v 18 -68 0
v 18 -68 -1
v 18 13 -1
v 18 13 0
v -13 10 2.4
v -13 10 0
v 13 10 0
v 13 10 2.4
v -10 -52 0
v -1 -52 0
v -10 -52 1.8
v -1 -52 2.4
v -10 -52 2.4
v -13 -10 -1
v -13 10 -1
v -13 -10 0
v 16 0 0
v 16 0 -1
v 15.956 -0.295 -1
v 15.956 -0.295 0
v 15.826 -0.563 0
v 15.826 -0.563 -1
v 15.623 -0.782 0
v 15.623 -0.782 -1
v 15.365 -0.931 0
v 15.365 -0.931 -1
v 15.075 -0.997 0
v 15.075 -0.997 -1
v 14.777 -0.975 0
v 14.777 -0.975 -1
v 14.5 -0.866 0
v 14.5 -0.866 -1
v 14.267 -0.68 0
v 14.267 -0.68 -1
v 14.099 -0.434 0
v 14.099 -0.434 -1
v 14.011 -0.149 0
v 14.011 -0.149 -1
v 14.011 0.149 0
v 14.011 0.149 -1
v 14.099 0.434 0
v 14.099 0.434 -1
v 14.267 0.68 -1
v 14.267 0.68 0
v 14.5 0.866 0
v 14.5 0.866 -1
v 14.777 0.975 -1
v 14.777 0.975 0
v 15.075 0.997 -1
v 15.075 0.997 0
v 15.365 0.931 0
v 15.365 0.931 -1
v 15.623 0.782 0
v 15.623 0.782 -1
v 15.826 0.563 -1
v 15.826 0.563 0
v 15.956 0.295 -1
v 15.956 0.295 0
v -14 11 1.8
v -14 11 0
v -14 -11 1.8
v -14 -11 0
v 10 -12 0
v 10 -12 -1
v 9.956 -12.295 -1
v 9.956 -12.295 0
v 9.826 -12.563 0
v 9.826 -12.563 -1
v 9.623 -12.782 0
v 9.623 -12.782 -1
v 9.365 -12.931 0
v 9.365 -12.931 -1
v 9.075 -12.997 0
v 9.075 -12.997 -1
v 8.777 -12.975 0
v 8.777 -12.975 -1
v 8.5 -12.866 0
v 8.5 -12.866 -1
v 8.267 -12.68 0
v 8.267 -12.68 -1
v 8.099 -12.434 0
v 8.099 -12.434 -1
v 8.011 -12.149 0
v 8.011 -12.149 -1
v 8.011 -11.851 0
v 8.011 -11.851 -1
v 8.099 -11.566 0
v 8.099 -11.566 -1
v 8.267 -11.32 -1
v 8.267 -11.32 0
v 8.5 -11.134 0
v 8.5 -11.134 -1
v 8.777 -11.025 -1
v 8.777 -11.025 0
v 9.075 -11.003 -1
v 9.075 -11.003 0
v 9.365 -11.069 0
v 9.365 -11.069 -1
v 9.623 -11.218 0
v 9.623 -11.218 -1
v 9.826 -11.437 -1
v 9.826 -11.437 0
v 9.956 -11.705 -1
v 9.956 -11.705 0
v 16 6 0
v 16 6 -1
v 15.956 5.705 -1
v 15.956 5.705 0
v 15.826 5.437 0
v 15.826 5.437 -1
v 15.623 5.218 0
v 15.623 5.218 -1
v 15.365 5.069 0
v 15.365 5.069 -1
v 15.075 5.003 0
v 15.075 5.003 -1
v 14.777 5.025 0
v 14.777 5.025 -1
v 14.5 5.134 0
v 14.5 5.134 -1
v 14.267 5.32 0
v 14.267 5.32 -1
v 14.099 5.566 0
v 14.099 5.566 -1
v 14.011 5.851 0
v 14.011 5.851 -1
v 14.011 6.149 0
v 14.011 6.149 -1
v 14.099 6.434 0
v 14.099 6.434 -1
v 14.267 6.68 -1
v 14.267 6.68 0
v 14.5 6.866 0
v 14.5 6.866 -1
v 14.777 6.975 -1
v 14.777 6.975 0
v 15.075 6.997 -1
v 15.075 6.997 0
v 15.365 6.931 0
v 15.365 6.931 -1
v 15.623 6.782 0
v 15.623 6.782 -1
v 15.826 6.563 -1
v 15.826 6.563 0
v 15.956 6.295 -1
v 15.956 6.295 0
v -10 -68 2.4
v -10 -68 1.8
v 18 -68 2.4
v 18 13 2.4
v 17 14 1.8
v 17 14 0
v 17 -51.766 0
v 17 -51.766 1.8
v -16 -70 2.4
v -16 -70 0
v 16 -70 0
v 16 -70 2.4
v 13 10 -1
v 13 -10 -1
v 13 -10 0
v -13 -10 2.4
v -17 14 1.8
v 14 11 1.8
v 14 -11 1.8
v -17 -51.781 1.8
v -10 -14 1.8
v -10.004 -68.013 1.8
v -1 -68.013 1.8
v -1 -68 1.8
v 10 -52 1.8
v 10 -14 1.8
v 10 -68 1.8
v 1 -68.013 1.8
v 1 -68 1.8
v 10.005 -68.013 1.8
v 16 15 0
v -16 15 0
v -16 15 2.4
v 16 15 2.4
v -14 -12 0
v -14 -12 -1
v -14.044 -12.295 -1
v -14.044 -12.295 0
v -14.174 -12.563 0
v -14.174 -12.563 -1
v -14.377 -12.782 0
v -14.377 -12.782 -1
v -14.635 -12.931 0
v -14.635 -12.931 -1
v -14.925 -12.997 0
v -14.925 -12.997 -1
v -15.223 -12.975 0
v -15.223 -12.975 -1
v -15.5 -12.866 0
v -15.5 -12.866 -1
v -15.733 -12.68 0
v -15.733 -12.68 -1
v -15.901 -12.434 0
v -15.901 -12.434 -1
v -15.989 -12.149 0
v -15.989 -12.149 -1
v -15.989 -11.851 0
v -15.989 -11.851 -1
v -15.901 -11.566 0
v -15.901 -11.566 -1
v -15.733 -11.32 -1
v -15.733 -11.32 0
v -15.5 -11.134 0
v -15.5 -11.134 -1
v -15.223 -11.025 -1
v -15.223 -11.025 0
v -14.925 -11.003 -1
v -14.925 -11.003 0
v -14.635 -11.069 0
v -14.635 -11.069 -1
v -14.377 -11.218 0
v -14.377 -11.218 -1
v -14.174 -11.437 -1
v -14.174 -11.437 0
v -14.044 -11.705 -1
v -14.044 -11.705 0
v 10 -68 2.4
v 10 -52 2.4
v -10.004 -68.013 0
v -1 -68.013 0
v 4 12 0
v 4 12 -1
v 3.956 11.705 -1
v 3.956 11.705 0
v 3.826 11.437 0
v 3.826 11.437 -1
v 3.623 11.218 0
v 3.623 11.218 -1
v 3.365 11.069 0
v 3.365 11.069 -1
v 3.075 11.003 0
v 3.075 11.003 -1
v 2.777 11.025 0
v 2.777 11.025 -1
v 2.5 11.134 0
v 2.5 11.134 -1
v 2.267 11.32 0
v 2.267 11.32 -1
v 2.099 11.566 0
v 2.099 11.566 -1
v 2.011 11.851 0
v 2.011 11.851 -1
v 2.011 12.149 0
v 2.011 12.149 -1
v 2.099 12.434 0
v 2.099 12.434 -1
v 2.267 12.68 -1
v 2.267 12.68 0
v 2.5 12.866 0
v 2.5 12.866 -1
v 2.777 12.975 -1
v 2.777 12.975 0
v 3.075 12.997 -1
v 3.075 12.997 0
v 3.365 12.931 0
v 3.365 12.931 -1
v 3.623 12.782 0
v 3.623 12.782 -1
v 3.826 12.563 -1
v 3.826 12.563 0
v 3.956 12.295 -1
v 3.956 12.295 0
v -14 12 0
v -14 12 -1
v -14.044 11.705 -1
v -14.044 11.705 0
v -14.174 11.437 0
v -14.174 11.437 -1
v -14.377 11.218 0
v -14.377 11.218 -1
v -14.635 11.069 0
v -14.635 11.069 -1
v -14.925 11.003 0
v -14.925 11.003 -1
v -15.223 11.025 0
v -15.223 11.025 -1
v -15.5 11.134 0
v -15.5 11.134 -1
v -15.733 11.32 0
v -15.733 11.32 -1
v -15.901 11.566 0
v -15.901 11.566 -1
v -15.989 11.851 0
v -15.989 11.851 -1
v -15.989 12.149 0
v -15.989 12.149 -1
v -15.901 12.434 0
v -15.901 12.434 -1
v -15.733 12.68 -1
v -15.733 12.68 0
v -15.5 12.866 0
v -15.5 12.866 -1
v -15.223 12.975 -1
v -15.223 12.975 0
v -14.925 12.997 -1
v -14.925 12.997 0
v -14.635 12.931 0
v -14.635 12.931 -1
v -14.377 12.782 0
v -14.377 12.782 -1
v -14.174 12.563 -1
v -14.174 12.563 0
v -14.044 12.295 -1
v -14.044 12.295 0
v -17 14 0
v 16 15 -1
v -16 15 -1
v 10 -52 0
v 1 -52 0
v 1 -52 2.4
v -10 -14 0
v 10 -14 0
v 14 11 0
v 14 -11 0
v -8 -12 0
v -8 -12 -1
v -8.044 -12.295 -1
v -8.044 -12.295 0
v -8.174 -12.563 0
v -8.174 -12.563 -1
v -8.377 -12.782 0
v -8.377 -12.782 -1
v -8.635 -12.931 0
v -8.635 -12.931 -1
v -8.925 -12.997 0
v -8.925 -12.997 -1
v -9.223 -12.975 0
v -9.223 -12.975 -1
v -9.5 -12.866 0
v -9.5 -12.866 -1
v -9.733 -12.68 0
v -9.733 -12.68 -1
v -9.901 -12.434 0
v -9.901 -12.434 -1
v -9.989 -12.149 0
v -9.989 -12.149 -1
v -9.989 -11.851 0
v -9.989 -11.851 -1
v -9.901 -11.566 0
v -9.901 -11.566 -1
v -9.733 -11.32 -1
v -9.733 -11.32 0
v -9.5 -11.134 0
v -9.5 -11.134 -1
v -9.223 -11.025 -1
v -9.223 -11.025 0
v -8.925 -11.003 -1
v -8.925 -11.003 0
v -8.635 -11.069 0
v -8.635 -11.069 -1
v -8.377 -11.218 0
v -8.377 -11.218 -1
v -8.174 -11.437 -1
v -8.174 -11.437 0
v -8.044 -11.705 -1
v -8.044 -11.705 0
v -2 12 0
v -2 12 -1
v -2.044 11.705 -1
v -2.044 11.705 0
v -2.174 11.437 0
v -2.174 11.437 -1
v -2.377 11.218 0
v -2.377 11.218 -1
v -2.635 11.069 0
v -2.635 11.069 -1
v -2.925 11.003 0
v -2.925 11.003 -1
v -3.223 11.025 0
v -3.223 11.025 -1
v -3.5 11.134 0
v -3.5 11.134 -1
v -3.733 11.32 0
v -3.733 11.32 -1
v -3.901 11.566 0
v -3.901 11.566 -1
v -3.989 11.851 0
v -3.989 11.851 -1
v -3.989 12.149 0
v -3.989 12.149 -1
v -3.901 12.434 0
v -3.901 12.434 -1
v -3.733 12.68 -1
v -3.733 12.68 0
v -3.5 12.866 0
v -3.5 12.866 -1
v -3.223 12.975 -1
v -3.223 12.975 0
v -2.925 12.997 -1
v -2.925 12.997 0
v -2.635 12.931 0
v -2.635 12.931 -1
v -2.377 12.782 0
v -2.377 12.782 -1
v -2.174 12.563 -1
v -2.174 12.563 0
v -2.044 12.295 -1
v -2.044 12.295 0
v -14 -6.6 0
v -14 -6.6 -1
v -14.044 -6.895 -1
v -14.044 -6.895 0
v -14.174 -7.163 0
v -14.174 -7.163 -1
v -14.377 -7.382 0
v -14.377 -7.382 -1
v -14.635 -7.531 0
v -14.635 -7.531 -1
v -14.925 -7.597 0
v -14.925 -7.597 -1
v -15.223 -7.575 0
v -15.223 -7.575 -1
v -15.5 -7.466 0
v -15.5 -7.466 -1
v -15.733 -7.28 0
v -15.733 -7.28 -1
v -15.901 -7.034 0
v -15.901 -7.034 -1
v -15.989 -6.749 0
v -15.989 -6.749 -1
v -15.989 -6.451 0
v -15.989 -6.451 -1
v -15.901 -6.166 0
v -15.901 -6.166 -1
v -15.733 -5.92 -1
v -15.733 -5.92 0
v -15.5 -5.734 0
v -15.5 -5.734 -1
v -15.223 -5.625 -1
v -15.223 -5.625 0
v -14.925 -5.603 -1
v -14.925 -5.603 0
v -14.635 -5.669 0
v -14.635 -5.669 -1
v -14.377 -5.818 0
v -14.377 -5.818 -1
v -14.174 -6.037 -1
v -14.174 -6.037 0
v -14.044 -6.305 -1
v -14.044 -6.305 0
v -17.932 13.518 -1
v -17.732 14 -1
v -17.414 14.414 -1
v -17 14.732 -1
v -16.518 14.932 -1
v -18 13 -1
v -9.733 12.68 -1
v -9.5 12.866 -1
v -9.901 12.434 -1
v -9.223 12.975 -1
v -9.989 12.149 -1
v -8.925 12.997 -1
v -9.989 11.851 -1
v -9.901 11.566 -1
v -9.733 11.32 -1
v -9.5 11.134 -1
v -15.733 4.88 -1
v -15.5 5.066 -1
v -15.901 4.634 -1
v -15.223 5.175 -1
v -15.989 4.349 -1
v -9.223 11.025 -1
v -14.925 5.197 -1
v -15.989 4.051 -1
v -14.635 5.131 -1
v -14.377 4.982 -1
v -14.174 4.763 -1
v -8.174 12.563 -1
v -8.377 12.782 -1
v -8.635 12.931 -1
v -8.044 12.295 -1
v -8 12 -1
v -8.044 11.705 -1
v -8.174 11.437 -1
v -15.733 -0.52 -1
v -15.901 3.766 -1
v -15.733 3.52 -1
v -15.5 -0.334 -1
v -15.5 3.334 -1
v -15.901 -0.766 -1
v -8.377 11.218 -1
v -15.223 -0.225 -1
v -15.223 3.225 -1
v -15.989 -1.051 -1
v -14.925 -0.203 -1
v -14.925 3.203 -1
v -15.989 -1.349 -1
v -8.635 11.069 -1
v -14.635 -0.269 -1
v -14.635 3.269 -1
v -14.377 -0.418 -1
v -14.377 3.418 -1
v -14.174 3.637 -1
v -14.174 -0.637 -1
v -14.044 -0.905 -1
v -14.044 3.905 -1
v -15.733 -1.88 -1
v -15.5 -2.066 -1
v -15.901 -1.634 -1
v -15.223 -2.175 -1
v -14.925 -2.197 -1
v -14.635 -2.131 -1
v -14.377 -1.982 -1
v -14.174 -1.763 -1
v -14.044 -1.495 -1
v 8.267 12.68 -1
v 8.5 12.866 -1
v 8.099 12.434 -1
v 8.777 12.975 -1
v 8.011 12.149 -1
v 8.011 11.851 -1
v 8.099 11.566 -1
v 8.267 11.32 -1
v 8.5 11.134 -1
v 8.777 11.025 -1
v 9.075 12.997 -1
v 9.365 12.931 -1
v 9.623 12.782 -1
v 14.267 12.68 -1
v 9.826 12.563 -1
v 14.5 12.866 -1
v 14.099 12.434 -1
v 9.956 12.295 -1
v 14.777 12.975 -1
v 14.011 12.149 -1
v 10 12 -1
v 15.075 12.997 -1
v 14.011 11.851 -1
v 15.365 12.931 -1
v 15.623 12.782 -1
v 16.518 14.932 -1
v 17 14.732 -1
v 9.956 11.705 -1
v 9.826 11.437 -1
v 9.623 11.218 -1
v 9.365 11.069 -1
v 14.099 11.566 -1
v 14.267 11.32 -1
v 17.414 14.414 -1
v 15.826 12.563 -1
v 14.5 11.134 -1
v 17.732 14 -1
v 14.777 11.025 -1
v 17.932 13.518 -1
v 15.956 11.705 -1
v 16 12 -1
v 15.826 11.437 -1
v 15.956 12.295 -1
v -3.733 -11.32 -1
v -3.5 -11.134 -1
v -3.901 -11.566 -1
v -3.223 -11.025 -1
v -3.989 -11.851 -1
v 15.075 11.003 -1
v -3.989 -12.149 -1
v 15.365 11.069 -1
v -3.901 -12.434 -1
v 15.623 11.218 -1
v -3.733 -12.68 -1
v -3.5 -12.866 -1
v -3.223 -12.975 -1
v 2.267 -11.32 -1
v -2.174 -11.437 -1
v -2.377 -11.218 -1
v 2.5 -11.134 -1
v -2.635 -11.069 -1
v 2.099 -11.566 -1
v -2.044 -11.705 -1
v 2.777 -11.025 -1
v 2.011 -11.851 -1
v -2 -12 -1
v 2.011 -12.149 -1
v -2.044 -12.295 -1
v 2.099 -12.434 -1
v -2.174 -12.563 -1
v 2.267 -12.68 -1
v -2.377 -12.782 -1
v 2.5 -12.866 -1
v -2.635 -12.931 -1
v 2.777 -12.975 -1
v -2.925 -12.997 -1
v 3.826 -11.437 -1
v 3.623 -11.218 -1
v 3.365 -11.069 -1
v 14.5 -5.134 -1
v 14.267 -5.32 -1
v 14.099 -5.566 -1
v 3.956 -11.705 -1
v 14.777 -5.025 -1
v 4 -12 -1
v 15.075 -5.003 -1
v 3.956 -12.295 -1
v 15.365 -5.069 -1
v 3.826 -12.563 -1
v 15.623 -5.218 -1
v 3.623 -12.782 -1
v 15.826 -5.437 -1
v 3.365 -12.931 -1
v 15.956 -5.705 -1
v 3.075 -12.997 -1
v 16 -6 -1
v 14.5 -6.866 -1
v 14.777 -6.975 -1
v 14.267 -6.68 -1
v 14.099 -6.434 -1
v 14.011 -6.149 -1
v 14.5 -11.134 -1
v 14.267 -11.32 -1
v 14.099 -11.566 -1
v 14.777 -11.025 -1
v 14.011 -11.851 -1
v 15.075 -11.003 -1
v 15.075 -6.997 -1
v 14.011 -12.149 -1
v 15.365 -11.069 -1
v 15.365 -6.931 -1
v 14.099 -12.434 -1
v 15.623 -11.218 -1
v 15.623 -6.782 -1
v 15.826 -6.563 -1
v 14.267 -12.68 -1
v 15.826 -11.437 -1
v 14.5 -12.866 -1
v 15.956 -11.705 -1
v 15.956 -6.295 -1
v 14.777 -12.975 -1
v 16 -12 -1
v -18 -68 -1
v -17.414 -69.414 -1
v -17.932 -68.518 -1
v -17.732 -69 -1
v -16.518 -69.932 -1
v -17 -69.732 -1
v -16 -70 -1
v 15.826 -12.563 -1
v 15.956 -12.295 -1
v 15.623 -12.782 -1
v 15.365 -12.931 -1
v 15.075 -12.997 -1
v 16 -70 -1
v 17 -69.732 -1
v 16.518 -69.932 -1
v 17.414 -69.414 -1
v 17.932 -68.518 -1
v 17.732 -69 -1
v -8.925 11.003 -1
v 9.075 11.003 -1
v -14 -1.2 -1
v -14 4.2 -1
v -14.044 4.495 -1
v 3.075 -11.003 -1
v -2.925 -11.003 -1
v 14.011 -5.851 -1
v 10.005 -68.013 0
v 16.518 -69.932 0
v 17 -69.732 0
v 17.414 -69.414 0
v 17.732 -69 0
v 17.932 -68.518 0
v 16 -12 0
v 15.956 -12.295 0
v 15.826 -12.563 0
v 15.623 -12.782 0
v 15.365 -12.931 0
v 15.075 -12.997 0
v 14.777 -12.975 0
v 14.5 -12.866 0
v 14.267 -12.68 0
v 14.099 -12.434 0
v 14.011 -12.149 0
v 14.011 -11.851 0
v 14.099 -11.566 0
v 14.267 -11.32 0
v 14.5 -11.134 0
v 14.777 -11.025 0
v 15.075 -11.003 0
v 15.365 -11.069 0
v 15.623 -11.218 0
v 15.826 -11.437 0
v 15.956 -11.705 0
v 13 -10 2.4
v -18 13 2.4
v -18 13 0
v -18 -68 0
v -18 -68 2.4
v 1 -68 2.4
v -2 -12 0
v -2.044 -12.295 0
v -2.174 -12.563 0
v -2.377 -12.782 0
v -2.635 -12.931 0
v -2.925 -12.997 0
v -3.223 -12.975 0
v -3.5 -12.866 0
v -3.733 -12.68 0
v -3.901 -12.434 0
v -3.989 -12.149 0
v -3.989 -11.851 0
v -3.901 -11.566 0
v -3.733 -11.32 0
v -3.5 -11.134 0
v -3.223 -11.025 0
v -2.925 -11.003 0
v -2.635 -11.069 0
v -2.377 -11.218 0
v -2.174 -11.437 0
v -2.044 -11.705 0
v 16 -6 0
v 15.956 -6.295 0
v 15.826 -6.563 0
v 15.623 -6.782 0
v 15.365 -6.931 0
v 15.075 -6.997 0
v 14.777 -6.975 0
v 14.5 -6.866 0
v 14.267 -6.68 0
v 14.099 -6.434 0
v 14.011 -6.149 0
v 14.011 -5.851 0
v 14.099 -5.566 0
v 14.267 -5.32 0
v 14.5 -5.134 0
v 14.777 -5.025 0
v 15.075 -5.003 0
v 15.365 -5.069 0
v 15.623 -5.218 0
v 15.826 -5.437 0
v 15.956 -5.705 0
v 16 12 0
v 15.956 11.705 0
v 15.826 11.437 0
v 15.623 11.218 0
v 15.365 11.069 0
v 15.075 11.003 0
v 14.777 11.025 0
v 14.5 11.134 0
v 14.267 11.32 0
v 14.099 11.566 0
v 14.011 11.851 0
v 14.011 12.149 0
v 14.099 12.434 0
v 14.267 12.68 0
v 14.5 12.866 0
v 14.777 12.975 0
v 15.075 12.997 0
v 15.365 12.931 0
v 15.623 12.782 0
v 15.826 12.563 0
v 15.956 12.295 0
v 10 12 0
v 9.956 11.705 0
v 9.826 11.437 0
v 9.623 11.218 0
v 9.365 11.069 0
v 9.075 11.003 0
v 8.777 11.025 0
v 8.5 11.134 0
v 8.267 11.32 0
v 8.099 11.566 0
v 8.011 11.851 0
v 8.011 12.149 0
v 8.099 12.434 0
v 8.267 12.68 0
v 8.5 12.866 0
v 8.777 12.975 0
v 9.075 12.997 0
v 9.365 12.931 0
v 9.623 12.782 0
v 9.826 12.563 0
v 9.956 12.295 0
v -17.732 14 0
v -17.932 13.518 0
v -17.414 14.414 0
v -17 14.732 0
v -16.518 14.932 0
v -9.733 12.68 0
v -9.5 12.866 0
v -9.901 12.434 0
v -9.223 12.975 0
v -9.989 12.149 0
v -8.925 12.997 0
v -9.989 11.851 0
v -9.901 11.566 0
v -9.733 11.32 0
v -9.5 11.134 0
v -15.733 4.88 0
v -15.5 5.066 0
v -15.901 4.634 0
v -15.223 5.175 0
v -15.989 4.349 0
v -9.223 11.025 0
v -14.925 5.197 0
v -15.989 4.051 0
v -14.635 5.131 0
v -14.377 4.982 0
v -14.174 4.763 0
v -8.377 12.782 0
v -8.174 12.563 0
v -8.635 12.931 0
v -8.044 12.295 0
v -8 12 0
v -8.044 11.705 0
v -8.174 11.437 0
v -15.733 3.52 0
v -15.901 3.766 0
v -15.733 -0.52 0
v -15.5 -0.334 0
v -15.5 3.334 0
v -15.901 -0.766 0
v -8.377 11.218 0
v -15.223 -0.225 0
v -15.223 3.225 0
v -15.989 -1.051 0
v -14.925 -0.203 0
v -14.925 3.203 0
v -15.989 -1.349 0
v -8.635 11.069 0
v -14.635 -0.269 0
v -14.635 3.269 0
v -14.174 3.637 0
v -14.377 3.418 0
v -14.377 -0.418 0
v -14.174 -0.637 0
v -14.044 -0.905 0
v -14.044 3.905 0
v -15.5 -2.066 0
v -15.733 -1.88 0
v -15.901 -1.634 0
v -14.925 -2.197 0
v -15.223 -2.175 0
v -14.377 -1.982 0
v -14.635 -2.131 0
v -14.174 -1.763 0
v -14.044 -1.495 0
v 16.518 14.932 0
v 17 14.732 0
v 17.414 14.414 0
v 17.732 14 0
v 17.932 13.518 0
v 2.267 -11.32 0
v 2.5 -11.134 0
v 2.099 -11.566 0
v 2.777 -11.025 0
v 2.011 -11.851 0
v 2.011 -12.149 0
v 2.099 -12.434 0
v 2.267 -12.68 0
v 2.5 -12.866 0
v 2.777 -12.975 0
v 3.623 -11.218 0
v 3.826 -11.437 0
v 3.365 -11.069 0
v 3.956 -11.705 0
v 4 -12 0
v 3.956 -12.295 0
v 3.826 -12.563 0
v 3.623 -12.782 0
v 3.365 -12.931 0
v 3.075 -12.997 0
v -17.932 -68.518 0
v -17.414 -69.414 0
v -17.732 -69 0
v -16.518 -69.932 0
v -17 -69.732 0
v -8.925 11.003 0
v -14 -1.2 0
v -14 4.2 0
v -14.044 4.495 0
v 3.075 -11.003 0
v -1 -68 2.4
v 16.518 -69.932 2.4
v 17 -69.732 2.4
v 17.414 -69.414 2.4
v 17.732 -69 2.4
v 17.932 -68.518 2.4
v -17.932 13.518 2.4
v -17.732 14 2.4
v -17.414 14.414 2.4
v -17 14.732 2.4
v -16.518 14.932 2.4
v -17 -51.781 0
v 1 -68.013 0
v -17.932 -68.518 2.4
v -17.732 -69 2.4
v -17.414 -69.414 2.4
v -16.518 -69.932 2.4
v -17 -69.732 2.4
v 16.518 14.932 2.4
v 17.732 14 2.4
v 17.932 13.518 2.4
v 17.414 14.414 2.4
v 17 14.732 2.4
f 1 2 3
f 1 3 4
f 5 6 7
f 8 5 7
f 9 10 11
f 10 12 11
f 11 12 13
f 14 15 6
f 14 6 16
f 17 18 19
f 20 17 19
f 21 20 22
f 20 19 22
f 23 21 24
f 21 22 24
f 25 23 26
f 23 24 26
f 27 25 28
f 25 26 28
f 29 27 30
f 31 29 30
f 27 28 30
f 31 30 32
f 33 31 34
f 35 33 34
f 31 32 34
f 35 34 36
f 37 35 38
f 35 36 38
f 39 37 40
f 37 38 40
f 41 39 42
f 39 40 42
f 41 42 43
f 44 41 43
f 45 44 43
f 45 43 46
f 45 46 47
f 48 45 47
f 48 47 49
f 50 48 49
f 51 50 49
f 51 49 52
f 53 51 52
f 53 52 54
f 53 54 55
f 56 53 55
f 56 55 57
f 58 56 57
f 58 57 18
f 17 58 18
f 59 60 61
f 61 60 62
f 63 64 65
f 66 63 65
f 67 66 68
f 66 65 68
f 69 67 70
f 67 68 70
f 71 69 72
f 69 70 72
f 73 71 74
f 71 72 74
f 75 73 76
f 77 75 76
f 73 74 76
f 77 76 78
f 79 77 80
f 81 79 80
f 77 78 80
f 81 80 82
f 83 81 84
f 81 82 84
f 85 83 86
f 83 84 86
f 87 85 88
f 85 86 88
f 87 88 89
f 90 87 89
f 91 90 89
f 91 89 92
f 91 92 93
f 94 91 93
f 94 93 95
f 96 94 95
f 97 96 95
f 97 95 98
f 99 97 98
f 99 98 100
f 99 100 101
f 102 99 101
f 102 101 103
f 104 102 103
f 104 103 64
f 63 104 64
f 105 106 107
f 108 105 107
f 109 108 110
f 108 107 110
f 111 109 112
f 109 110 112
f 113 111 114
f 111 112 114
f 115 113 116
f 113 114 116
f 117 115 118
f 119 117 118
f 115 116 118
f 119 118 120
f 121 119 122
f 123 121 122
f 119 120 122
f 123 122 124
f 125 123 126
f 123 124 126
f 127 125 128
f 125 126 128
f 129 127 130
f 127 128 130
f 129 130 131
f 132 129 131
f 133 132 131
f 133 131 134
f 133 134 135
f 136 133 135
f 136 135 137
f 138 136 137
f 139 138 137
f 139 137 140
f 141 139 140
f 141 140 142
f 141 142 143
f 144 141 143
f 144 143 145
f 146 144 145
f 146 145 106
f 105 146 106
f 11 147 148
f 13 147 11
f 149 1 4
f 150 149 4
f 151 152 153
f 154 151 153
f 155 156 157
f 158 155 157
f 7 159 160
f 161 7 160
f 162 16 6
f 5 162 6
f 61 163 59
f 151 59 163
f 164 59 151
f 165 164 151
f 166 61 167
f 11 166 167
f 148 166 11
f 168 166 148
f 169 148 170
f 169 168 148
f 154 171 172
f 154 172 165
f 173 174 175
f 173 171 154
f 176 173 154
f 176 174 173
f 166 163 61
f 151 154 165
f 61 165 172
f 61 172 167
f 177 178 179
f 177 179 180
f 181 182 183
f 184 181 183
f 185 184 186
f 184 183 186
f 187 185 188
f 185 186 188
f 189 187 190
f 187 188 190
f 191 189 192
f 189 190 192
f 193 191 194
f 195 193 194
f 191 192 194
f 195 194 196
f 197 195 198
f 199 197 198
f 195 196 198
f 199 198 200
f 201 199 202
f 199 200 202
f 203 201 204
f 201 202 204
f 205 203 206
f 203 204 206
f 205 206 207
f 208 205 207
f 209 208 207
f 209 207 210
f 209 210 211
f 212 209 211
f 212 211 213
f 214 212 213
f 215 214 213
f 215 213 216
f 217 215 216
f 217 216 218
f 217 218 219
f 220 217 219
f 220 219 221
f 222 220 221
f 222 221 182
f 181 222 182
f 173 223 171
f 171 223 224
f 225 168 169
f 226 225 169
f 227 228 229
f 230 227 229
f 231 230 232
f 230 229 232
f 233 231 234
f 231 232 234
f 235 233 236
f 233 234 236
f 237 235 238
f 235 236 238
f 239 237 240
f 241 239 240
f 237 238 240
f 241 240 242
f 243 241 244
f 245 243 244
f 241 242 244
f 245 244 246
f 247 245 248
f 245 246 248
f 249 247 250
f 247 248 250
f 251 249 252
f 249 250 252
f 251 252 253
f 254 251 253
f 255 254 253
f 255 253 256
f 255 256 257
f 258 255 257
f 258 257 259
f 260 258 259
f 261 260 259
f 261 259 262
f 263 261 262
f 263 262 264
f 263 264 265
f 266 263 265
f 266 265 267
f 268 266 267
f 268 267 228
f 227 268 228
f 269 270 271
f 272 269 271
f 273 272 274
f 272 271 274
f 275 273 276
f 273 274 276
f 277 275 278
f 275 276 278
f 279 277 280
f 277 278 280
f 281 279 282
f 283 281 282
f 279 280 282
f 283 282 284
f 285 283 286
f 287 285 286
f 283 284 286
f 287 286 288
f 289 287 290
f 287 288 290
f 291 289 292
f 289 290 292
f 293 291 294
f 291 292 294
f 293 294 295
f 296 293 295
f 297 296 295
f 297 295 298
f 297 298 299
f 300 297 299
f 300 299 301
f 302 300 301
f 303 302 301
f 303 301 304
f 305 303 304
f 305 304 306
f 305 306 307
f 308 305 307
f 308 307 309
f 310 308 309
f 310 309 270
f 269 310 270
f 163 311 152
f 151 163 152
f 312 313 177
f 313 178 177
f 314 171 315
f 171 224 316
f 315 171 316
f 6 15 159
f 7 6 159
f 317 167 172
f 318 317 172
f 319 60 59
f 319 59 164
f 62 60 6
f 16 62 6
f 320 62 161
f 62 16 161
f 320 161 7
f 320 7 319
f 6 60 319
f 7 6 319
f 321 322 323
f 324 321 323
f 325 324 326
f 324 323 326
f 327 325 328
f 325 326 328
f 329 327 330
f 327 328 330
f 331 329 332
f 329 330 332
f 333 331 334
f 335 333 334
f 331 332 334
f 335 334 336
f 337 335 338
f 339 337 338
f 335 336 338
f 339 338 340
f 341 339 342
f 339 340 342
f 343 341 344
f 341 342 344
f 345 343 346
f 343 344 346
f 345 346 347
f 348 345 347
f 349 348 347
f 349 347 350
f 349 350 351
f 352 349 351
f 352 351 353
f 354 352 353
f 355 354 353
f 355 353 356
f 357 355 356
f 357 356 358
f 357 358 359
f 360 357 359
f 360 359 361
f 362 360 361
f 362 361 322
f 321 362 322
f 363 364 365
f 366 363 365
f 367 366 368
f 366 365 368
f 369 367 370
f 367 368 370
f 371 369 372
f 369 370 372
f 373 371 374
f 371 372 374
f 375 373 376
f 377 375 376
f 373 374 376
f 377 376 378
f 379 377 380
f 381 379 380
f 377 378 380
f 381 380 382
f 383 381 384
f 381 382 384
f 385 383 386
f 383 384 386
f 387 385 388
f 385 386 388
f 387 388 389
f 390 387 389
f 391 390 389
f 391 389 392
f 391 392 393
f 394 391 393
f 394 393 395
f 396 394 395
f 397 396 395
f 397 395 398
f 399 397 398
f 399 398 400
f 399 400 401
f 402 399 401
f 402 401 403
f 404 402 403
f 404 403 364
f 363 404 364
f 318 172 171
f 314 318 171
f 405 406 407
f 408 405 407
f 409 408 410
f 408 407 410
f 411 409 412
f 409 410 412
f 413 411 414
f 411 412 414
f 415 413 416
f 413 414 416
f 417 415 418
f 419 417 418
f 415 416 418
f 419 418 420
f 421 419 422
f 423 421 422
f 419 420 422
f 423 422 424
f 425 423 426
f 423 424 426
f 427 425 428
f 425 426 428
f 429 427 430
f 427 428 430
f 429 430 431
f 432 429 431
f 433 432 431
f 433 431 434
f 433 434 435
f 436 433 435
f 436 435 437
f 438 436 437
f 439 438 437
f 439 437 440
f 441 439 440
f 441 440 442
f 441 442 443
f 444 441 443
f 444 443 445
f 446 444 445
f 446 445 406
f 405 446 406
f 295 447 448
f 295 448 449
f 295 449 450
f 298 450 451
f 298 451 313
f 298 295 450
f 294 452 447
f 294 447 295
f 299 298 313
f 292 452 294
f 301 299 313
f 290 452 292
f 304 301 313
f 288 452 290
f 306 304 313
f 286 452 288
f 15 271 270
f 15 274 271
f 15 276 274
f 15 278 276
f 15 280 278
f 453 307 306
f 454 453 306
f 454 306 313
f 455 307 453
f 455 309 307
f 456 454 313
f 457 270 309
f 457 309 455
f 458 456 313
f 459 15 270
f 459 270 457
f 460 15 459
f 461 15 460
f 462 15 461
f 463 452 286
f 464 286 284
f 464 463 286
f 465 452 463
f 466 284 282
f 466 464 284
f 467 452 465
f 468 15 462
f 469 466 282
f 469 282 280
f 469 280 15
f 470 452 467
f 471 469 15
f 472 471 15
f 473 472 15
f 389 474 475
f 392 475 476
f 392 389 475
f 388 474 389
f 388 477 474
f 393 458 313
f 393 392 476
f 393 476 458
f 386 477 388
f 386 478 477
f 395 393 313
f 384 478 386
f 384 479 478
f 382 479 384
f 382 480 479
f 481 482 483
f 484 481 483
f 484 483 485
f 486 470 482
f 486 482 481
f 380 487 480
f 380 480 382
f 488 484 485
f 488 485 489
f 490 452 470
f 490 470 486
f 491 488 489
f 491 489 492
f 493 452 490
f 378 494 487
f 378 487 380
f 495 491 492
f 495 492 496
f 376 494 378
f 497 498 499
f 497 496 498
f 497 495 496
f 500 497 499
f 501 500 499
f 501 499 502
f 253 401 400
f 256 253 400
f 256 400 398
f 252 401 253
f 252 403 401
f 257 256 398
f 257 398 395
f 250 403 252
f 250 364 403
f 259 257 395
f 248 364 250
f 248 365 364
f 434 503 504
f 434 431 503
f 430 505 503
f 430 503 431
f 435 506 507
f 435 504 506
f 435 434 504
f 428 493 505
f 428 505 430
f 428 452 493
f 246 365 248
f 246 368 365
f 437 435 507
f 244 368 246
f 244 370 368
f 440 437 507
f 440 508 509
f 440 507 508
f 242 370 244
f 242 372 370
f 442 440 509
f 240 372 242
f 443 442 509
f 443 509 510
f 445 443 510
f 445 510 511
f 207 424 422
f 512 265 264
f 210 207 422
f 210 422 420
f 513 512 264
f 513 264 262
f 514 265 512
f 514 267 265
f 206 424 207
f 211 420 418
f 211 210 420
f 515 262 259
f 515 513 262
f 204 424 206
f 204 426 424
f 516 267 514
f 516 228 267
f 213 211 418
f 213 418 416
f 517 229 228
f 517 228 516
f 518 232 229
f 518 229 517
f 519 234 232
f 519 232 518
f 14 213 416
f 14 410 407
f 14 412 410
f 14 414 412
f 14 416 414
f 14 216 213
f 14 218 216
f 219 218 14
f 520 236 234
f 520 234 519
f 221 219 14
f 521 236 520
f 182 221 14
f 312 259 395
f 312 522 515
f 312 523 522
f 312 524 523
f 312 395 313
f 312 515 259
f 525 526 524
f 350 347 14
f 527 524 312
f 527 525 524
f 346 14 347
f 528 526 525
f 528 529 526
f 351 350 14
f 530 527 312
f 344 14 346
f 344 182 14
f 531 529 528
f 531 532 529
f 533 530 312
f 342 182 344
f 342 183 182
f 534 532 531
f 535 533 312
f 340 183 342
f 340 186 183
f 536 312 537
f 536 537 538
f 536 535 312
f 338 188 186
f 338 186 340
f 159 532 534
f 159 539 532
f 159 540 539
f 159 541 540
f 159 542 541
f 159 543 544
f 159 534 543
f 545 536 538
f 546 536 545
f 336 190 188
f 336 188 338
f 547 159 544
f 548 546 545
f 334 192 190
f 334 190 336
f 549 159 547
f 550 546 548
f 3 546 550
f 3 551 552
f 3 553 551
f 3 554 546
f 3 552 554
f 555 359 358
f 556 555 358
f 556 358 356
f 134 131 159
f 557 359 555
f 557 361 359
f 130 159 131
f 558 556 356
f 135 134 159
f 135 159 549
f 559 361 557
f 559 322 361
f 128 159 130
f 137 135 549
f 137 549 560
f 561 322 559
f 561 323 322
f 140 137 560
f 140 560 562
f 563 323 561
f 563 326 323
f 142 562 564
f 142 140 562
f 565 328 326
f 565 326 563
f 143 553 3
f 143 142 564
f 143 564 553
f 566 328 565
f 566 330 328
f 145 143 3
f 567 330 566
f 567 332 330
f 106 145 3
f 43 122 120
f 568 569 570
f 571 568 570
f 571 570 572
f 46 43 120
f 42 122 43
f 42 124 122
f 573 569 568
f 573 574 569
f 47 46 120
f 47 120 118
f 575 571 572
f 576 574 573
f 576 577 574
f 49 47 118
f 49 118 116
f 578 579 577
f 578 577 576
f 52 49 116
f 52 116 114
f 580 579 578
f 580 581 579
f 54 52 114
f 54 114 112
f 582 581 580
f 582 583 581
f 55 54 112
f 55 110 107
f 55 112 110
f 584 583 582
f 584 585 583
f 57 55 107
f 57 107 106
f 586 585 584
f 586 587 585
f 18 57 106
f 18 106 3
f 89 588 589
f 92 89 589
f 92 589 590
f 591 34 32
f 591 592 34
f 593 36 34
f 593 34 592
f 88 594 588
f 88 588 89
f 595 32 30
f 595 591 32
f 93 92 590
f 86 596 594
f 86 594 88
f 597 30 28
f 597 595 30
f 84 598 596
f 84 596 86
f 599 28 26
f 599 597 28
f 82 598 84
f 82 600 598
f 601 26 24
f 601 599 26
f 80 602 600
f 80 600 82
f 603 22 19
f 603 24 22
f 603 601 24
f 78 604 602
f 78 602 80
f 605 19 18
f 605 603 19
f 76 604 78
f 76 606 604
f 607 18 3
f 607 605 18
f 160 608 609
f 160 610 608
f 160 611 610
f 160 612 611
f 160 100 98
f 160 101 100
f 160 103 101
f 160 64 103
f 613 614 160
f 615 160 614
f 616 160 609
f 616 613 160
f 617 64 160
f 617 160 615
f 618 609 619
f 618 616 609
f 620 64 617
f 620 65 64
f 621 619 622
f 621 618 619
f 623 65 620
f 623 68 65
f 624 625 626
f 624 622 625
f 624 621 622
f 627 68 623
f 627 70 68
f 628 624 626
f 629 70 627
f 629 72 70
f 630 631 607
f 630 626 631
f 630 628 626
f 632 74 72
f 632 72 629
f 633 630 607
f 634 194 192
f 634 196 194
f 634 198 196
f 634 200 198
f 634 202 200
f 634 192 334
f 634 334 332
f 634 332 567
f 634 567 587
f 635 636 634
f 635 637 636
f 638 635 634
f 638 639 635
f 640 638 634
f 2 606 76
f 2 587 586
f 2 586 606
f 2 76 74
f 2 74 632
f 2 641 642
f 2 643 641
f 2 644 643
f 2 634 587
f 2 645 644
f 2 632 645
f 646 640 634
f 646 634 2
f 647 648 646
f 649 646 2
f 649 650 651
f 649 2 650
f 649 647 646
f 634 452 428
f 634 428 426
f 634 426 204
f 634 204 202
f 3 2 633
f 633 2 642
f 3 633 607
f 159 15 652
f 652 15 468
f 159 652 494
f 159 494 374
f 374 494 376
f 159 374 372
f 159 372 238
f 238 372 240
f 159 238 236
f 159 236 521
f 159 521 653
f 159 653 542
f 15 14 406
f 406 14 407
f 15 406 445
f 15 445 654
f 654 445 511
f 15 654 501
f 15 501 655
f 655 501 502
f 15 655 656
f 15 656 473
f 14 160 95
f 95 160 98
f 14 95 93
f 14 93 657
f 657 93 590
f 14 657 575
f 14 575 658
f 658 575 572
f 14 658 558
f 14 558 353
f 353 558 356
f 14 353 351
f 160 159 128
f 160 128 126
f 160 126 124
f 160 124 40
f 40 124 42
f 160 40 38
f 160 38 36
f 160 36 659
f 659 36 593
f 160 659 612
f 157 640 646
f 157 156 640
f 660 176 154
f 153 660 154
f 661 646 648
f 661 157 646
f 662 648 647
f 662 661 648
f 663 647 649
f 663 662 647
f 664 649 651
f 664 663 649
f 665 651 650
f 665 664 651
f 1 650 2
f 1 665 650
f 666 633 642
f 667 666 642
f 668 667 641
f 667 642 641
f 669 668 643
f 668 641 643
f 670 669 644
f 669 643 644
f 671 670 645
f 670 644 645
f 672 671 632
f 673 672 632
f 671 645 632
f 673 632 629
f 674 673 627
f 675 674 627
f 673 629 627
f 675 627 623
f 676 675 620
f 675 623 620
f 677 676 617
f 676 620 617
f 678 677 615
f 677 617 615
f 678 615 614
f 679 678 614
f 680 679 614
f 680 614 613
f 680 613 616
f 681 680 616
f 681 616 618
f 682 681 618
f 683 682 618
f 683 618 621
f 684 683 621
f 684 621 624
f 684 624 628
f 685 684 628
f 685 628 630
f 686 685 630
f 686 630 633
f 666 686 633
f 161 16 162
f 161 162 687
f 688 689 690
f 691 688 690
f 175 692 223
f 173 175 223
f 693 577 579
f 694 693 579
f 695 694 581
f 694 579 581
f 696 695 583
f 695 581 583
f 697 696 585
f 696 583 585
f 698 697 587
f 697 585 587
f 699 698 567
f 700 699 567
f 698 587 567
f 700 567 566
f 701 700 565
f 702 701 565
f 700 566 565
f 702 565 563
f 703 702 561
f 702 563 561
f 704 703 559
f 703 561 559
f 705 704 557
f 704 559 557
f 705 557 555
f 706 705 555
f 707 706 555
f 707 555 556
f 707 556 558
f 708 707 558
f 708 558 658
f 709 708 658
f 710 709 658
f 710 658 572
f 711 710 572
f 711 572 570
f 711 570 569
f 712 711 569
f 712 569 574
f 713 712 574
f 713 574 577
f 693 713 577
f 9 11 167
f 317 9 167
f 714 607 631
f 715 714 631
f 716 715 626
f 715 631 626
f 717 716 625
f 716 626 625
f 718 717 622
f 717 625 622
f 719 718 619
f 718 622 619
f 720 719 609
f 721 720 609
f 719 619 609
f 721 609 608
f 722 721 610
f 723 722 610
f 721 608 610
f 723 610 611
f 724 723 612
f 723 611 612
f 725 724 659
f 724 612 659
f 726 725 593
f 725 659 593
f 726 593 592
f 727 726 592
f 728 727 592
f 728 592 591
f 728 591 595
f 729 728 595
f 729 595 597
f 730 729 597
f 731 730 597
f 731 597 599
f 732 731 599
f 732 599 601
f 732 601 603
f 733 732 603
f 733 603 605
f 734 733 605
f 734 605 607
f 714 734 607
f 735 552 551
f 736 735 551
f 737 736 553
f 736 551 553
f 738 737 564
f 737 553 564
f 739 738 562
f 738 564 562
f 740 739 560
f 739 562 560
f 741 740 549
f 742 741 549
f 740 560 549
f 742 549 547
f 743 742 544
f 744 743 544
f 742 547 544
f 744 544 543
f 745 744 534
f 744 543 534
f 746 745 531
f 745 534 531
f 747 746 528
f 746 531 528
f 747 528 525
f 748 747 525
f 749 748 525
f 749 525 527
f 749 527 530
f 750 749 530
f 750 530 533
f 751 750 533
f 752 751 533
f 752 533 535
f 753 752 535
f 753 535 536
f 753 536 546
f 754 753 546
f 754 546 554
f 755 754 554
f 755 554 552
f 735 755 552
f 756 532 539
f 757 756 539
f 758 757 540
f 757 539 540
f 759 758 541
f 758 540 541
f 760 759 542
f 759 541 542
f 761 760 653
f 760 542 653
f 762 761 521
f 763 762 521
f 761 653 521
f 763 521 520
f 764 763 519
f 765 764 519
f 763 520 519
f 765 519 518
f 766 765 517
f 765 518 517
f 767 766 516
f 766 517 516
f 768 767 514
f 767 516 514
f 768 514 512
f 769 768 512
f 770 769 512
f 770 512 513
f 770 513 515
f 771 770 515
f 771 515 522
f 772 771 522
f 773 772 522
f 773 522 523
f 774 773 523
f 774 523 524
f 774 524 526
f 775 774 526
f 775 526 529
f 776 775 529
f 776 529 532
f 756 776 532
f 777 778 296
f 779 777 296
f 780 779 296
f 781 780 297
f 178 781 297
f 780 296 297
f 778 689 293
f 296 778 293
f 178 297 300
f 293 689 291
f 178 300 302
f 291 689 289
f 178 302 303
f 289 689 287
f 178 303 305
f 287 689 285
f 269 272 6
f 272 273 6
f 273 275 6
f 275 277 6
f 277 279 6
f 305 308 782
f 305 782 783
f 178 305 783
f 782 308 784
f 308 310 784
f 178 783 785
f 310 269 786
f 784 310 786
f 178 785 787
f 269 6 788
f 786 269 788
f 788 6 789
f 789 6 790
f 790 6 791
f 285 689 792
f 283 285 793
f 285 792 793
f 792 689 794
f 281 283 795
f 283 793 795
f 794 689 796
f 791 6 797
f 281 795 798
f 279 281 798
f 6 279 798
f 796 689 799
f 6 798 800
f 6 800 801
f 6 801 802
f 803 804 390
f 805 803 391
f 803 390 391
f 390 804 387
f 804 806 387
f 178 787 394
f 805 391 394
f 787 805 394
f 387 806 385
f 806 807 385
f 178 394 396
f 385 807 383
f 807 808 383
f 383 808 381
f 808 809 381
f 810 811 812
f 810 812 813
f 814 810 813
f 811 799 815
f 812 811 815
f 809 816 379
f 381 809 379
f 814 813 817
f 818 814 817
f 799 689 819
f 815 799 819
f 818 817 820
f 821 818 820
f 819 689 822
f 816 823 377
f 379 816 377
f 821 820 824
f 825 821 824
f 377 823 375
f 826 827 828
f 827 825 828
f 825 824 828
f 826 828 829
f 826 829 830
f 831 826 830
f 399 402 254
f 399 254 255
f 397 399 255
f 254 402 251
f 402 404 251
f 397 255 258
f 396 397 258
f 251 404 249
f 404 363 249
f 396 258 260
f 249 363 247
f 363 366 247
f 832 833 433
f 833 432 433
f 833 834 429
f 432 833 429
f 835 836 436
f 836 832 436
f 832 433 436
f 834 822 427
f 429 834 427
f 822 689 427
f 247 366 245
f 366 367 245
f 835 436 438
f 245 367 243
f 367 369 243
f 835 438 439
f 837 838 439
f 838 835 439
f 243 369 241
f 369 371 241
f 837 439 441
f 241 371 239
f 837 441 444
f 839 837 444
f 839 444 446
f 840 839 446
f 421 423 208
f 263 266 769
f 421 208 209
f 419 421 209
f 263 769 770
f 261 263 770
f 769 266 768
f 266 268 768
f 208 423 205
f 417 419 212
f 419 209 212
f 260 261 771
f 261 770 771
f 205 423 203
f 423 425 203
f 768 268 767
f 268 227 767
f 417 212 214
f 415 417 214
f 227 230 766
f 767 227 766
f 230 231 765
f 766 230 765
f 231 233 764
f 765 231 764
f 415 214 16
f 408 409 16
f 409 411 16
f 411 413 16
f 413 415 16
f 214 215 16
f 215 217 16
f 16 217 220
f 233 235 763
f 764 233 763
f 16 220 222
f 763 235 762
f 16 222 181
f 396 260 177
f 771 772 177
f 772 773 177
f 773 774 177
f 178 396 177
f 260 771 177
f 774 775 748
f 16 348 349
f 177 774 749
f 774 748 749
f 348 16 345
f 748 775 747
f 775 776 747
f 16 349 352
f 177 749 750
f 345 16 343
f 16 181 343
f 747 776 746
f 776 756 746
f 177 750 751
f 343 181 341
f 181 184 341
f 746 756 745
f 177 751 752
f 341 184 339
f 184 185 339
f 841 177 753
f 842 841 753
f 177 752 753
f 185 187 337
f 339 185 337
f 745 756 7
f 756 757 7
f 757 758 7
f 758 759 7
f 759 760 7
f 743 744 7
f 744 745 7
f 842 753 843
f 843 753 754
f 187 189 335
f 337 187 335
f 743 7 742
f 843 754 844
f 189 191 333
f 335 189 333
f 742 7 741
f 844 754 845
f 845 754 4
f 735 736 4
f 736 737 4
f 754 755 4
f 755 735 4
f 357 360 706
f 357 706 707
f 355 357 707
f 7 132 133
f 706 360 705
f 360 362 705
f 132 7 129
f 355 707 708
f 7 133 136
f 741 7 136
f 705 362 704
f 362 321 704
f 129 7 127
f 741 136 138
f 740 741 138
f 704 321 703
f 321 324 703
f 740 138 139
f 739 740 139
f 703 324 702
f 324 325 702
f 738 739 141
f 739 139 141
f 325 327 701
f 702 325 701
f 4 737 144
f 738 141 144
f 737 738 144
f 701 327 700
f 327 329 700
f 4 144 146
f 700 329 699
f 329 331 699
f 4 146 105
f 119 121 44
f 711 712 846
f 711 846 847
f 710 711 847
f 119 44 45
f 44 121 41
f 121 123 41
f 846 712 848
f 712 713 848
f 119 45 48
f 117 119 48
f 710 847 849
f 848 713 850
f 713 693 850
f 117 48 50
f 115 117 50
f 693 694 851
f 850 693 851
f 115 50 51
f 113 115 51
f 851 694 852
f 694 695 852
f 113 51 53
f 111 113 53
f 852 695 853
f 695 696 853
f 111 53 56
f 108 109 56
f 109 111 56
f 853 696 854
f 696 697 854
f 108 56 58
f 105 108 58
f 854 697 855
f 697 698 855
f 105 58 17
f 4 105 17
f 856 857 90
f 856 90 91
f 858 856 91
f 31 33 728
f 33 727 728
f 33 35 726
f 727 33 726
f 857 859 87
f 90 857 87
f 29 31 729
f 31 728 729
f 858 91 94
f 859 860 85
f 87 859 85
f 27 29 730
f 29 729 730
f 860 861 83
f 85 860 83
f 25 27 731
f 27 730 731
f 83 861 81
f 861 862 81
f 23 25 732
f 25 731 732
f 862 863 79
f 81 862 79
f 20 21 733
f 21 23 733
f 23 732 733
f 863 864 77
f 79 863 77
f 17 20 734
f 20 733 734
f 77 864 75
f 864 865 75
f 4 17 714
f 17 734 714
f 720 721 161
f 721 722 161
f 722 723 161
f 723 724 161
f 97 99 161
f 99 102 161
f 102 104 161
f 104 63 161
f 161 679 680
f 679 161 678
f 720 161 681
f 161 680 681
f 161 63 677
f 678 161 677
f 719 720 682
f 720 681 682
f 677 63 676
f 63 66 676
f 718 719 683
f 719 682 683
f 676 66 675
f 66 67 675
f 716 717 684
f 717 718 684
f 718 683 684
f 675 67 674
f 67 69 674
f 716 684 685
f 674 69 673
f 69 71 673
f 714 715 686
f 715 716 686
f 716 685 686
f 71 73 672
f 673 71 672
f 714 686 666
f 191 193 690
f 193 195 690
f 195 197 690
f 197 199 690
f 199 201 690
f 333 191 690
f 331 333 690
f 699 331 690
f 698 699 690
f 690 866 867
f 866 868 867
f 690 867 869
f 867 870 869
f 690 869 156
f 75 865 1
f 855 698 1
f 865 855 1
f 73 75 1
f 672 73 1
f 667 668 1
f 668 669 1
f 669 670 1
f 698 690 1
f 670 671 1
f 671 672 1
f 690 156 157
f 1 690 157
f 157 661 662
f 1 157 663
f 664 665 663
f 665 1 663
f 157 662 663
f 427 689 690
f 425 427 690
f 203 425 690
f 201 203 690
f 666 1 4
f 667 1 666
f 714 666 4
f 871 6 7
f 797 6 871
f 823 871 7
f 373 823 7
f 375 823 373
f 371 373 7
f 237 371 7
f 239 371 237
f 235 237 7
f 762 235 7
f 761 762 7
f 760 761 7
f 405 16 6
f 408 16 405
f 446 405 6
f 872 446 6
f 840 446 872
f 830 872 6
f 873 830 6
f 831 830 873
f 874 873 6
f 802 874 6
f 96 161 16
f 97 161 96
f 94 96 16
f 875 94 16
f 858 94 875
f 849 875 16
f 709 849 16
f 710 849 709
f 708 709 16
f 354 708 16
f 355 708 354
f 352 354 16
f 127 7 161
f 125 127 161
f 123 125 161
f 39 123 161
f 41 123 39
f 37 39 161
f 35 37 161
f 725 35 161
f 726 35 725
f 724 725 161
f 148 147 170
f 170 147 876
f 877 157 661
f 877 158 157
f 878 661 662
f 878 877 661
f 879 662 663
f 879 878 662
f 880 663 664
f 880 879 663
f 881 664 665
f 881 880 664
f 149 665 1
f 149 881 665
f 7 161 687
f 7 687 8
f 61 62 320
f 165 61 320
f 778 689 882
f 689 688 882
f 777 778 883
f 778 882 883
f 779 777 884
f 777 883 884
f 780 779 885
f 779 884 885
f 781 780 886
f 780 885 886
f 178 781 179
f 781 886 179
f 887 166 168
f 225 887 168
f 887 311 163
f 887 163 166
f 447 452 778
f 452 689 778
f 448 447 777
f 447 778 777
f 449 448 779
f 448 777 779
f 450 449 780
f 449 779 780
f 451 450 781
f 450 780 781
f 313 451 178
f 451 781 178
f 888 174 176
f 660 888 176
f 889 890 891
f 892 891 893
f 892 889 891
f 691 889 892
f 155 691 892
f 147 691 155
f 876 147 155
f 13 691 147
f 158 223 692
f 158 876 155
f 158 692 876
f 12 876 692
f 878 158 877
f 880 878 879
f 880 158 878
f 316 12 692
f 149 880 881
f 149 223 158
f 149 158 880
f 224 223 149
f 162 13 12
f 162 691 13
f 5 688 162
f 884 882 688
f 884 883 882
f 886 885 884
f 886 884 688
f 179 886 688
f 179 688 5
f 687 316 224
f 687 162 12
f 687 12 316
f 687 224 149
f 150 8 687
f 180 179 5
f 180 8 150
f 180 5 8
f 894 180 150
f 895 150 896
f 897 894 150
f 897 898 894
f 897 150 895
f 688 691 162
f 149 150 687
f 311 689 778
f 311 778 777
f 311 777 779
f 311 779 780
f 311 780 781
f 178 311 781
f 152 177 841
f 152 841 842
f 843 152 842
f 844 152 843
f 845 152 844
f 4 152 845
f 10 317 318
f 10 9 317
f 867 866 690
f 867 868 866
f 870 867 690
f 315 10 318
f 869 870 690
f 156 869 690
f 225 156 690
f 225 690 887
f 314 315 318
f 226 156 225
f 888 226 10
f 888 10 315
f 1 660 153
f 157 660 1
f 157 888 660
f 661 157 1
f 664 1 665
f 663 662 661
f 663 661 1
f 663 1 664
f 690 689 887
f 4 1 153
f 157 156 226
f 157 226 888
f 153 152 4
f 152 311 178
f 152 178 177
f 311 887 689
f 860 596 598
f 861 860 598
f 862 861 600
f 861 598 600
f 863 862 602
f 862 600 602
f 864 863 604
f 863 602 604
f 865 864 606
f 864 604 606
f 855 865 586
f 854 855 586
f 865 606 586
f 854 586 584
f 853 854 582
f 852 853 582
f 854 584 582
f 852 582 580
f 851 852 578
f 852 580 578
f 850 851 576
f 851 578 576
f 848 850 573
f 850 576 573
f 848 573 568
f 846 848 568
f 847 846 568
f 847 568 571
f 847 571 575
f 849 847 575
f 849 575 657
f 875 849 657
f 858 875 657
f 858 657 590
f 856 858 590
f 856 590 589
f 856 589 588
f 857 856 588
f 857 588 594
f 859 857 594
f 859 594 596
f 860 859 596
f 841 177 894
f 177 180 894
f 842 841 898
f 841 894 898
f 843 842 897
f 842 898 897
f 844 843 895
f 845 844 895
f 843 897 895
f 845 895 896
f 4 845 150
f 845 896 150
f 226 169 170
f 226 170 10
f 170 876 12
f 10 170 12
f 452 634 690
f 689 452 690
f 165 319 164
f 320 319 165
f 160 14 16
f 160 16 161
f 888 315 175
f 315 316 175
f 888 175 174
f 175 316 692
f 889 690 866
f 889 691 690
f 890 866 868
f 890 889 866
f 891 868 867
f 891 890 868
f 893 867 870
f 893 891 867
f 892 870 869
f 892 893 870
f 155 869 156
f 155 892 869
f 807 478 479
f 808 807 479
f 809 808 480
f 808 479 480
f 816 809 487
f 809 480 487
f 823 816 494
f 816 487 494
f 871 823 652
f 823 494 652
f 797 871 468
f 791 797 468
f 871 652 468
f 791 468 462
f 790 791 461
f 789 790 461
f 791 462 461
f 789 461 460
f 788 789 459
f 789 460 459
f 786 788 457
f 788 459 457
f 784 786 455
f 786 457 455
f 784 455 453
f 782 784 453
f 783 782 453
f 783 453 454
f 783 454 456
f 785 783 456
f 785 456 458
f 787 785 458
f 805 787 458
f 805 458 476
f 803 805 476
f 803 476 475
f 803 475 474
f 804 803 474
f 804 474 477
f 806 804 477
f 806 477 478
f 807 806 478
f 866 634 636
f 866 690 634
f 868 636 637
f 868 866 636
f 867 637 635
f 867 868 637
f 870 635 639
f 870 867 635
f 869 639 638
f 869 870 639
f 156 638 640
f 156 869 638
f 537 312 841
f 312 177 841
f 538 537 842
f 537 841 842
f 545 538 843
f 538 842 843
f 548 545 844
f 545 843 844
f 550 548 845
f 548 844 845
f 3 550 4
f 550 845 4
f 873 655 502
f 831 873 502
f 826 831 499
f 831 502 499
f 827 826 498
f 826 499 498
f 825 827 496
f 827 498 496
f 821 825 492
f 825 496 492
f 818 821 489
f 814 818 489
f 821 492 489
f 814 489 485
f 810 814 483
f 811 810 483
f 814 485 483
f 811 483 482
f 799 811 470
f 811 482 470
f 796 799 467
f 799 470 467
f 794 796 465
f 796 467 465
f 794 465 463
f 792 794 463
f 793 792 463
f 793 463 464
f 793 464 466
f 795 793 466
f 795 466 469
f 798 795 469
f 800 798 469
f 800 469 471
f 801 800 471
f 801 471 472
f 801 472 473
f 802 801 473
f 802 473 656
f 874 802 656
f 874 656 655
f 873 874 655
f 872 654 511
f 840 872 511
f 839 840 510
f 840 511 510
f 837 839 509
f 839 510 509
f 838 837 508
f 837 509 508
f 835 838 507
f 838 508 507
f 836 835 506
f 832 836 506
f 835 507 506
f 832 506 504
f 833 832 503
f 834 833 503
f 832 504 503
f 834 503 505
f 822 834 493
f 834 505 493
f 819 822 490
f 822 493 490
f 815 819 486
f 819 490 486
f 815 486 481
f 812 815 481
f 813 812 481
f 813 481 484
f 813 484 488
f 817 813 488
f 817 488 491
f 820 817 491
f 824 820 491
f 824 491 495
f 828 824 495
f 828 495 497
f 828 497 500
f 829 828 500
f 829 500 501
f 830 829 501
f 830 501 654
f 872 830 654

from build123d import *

# Parameters (mm, degrees)
F0_W      = 36
F0_H      = 30
F0_W_2    = 26
F0_H_2    = 20
F0_H_3    = 37
F0_H_4    = 18
F1_DEPTH  = 2.4
F2_W      = 34
F2_H      = 83
F2_W_2    = 28
F2_H_2    = 22
F3_DEPTH  = 1.8
F4_W      = 36
F4_H      = 1
F5_DEPTH  = 85
F8_DEPTH  = 1.8
F6_R      = 1
F9_DEPTH  = 3
F6_W      = 26
F6_H      = 20
F11_DEPTH = 25
F12_R     = 2
F12_2_R   = 2
F10_W     = 9
F10_H     = 16
F13_DEPTH = 3


# Not quite as in the source:
# - a feature names something its author has since deleted; it is built from what else it names


with BuildPart() as f1:
    # F0 (on Top) → F1 (new body)
    with BuildSketch(Plane.XY):
        Rectangle(F0_W, F0_H)
        Rectangle(F0_W_2, F0_H_2, mode=Mode.SUBTRACT)
        with Locations((0, -33.5)):
            Rectangle(F0_W, F0_H_3)
        with Locations((0, -61)):
            Rectangle(F0_W, F0_H_4)
    extrude(amount=F1_DEPTH)

    # F2 (on face) → F3 (cut)
    with BuildSketch(Plane(origin=(0, 0, 0), x_dir=(1, 0, 0), z_dir=(0, 0, -1))):
        with Locations((0, 27.5)):
            Rectangle(F2_W, F2_H)
        Rectangle(F2_W_2, F2_H_2, mode=Mode.SUBTRACT)
    extrude(amount=-F3_DEPTH, mode=Mode.SUBTRACT)

    # F7 (on face) → F8 (join, through all)
    with BuildSketch(Plane(origin=(0, 0, 1.8), x_dir=(1, 0, 0), z_dir=(0, 0, -1))):
        Polygon((-10, 14), (0, 14), (10, 14), (10, 52), (1, 52), (0, 52), (-1, 52), (-10, 52), align=None)
        Polygon((-1, 68.013086915), (-1, 52), (0, 52), (1, 52), (1, 68.013086915), align=None)
        Polygon((-10.0040324032, 68.013086915), (-1, 68.013086915), (1, 68.013086915), (10.0048035383, 68.013086915), (17, 51.7664179206), (17, 69), (-17, 69), (-17, 53.814060986), (-17, 51.7814494669), align=None)
    extrude(amount=F8_DEPTH)

    # F12
    f12_edges = [f1.edges().sort_by_distance(p)[0] for p in [
        (18, 15, 1.2),
        (18, -70, 1.2),
        (-18, -70, 1.2),
        (-18, 15, 1.2),
    ]]
    fillet(f12_edges, radius=F12_R)

    # F10 (on face) → F13 (cut)
    with BuildSketch(Plane.XY.offset(2.4)):
        with Locations((5.5, -60)):
            Rectangle(F10_W, F10_H)
        with Locations((-5.5, -60)):
            Rectangle(F10_W, F10_H)
    extrude(amount=-F13_DEPTH, mode=Mode.SUBTRACT)


with BuildPart() as f5:
    # F4 (on face) → F5 (new body, through all)
    with BuildSketch(Plane.XZ.offset(70)):
        with Locations((0, -0.5)):
            Rectangle(F4_W, F4_H)
    extrude(amount=-F5_DEPTH)

    # F6 (on face) → F9 (cut)
    with BuildSketch(Plane(origin=(0, 0, -1), x_dir=(1, 0, 0), z_dir=(0, 0, -1))):
        with Locations((-15, -12)):
            Circle(F6_R)
        with Locations((-9, -12)):
            Circle(F6_R)
        with Locations((-3, -12)):
            Circle(F6_R)
        with Locations((3, -12)):
            Circle(F6_R)
        with Locations((9, -12)):
            Circle(F6_R)
        with Locations((15, -12)):
            Circle(F6_R)
        with Locations((15, -6)):
            Circle(F6_R)
        with Locations((15, 0)):
            Circle(F6_R)
        with Locations((15, 6)):
            Circle(F6_R)
        with Locations((15, 12)):
            Circle(F6_R)
        with Locations((9, 12)):
            Circle(F6_R)
        with Locations((3, 12)):
            Circle(F6_R)
        with Locations((-3, 12)):
            Circle(F6_R)
        with Locations((-9, 12)):
            Circle(F6_R)
        with Locations((-15, 12)):
            Circle(F6_R)
        with Locations((-15, 6.6)):
            Circle(F6_R)
        with Locations((-15, 1.2)):
            Circle(F6_R)
        with Locations((-15, -4.2)):
            Circle(F6_R)
    extrude(amount=-F9_DEPTH, mode=Mode.SUBTRACT)

    # F6 (on face) → F11 (cut)
    with BuildSketch(Plane(origin=(0, 0, -1), x_dir=(1, 0, 0), z_dir=(0, 0, -1))):
        Rectangle(F6_W, F6_H)
    extrude(amount=-F11_DEPTH, mode=Mode.SUBTRACT)

    # F12#2
    f12_2_edges = [f5.edges().sort_by_distance(p)[0] for p in [
        (18, 15, -0.5),
        (18, -70, -0.5),
        (-18, -70, -0.5),
        (-18, 15, -0.5),
    ]]
    fillet(f12_2_edges, radius=F12_2_R)


solid = Compound([f1.part, f5.part])
